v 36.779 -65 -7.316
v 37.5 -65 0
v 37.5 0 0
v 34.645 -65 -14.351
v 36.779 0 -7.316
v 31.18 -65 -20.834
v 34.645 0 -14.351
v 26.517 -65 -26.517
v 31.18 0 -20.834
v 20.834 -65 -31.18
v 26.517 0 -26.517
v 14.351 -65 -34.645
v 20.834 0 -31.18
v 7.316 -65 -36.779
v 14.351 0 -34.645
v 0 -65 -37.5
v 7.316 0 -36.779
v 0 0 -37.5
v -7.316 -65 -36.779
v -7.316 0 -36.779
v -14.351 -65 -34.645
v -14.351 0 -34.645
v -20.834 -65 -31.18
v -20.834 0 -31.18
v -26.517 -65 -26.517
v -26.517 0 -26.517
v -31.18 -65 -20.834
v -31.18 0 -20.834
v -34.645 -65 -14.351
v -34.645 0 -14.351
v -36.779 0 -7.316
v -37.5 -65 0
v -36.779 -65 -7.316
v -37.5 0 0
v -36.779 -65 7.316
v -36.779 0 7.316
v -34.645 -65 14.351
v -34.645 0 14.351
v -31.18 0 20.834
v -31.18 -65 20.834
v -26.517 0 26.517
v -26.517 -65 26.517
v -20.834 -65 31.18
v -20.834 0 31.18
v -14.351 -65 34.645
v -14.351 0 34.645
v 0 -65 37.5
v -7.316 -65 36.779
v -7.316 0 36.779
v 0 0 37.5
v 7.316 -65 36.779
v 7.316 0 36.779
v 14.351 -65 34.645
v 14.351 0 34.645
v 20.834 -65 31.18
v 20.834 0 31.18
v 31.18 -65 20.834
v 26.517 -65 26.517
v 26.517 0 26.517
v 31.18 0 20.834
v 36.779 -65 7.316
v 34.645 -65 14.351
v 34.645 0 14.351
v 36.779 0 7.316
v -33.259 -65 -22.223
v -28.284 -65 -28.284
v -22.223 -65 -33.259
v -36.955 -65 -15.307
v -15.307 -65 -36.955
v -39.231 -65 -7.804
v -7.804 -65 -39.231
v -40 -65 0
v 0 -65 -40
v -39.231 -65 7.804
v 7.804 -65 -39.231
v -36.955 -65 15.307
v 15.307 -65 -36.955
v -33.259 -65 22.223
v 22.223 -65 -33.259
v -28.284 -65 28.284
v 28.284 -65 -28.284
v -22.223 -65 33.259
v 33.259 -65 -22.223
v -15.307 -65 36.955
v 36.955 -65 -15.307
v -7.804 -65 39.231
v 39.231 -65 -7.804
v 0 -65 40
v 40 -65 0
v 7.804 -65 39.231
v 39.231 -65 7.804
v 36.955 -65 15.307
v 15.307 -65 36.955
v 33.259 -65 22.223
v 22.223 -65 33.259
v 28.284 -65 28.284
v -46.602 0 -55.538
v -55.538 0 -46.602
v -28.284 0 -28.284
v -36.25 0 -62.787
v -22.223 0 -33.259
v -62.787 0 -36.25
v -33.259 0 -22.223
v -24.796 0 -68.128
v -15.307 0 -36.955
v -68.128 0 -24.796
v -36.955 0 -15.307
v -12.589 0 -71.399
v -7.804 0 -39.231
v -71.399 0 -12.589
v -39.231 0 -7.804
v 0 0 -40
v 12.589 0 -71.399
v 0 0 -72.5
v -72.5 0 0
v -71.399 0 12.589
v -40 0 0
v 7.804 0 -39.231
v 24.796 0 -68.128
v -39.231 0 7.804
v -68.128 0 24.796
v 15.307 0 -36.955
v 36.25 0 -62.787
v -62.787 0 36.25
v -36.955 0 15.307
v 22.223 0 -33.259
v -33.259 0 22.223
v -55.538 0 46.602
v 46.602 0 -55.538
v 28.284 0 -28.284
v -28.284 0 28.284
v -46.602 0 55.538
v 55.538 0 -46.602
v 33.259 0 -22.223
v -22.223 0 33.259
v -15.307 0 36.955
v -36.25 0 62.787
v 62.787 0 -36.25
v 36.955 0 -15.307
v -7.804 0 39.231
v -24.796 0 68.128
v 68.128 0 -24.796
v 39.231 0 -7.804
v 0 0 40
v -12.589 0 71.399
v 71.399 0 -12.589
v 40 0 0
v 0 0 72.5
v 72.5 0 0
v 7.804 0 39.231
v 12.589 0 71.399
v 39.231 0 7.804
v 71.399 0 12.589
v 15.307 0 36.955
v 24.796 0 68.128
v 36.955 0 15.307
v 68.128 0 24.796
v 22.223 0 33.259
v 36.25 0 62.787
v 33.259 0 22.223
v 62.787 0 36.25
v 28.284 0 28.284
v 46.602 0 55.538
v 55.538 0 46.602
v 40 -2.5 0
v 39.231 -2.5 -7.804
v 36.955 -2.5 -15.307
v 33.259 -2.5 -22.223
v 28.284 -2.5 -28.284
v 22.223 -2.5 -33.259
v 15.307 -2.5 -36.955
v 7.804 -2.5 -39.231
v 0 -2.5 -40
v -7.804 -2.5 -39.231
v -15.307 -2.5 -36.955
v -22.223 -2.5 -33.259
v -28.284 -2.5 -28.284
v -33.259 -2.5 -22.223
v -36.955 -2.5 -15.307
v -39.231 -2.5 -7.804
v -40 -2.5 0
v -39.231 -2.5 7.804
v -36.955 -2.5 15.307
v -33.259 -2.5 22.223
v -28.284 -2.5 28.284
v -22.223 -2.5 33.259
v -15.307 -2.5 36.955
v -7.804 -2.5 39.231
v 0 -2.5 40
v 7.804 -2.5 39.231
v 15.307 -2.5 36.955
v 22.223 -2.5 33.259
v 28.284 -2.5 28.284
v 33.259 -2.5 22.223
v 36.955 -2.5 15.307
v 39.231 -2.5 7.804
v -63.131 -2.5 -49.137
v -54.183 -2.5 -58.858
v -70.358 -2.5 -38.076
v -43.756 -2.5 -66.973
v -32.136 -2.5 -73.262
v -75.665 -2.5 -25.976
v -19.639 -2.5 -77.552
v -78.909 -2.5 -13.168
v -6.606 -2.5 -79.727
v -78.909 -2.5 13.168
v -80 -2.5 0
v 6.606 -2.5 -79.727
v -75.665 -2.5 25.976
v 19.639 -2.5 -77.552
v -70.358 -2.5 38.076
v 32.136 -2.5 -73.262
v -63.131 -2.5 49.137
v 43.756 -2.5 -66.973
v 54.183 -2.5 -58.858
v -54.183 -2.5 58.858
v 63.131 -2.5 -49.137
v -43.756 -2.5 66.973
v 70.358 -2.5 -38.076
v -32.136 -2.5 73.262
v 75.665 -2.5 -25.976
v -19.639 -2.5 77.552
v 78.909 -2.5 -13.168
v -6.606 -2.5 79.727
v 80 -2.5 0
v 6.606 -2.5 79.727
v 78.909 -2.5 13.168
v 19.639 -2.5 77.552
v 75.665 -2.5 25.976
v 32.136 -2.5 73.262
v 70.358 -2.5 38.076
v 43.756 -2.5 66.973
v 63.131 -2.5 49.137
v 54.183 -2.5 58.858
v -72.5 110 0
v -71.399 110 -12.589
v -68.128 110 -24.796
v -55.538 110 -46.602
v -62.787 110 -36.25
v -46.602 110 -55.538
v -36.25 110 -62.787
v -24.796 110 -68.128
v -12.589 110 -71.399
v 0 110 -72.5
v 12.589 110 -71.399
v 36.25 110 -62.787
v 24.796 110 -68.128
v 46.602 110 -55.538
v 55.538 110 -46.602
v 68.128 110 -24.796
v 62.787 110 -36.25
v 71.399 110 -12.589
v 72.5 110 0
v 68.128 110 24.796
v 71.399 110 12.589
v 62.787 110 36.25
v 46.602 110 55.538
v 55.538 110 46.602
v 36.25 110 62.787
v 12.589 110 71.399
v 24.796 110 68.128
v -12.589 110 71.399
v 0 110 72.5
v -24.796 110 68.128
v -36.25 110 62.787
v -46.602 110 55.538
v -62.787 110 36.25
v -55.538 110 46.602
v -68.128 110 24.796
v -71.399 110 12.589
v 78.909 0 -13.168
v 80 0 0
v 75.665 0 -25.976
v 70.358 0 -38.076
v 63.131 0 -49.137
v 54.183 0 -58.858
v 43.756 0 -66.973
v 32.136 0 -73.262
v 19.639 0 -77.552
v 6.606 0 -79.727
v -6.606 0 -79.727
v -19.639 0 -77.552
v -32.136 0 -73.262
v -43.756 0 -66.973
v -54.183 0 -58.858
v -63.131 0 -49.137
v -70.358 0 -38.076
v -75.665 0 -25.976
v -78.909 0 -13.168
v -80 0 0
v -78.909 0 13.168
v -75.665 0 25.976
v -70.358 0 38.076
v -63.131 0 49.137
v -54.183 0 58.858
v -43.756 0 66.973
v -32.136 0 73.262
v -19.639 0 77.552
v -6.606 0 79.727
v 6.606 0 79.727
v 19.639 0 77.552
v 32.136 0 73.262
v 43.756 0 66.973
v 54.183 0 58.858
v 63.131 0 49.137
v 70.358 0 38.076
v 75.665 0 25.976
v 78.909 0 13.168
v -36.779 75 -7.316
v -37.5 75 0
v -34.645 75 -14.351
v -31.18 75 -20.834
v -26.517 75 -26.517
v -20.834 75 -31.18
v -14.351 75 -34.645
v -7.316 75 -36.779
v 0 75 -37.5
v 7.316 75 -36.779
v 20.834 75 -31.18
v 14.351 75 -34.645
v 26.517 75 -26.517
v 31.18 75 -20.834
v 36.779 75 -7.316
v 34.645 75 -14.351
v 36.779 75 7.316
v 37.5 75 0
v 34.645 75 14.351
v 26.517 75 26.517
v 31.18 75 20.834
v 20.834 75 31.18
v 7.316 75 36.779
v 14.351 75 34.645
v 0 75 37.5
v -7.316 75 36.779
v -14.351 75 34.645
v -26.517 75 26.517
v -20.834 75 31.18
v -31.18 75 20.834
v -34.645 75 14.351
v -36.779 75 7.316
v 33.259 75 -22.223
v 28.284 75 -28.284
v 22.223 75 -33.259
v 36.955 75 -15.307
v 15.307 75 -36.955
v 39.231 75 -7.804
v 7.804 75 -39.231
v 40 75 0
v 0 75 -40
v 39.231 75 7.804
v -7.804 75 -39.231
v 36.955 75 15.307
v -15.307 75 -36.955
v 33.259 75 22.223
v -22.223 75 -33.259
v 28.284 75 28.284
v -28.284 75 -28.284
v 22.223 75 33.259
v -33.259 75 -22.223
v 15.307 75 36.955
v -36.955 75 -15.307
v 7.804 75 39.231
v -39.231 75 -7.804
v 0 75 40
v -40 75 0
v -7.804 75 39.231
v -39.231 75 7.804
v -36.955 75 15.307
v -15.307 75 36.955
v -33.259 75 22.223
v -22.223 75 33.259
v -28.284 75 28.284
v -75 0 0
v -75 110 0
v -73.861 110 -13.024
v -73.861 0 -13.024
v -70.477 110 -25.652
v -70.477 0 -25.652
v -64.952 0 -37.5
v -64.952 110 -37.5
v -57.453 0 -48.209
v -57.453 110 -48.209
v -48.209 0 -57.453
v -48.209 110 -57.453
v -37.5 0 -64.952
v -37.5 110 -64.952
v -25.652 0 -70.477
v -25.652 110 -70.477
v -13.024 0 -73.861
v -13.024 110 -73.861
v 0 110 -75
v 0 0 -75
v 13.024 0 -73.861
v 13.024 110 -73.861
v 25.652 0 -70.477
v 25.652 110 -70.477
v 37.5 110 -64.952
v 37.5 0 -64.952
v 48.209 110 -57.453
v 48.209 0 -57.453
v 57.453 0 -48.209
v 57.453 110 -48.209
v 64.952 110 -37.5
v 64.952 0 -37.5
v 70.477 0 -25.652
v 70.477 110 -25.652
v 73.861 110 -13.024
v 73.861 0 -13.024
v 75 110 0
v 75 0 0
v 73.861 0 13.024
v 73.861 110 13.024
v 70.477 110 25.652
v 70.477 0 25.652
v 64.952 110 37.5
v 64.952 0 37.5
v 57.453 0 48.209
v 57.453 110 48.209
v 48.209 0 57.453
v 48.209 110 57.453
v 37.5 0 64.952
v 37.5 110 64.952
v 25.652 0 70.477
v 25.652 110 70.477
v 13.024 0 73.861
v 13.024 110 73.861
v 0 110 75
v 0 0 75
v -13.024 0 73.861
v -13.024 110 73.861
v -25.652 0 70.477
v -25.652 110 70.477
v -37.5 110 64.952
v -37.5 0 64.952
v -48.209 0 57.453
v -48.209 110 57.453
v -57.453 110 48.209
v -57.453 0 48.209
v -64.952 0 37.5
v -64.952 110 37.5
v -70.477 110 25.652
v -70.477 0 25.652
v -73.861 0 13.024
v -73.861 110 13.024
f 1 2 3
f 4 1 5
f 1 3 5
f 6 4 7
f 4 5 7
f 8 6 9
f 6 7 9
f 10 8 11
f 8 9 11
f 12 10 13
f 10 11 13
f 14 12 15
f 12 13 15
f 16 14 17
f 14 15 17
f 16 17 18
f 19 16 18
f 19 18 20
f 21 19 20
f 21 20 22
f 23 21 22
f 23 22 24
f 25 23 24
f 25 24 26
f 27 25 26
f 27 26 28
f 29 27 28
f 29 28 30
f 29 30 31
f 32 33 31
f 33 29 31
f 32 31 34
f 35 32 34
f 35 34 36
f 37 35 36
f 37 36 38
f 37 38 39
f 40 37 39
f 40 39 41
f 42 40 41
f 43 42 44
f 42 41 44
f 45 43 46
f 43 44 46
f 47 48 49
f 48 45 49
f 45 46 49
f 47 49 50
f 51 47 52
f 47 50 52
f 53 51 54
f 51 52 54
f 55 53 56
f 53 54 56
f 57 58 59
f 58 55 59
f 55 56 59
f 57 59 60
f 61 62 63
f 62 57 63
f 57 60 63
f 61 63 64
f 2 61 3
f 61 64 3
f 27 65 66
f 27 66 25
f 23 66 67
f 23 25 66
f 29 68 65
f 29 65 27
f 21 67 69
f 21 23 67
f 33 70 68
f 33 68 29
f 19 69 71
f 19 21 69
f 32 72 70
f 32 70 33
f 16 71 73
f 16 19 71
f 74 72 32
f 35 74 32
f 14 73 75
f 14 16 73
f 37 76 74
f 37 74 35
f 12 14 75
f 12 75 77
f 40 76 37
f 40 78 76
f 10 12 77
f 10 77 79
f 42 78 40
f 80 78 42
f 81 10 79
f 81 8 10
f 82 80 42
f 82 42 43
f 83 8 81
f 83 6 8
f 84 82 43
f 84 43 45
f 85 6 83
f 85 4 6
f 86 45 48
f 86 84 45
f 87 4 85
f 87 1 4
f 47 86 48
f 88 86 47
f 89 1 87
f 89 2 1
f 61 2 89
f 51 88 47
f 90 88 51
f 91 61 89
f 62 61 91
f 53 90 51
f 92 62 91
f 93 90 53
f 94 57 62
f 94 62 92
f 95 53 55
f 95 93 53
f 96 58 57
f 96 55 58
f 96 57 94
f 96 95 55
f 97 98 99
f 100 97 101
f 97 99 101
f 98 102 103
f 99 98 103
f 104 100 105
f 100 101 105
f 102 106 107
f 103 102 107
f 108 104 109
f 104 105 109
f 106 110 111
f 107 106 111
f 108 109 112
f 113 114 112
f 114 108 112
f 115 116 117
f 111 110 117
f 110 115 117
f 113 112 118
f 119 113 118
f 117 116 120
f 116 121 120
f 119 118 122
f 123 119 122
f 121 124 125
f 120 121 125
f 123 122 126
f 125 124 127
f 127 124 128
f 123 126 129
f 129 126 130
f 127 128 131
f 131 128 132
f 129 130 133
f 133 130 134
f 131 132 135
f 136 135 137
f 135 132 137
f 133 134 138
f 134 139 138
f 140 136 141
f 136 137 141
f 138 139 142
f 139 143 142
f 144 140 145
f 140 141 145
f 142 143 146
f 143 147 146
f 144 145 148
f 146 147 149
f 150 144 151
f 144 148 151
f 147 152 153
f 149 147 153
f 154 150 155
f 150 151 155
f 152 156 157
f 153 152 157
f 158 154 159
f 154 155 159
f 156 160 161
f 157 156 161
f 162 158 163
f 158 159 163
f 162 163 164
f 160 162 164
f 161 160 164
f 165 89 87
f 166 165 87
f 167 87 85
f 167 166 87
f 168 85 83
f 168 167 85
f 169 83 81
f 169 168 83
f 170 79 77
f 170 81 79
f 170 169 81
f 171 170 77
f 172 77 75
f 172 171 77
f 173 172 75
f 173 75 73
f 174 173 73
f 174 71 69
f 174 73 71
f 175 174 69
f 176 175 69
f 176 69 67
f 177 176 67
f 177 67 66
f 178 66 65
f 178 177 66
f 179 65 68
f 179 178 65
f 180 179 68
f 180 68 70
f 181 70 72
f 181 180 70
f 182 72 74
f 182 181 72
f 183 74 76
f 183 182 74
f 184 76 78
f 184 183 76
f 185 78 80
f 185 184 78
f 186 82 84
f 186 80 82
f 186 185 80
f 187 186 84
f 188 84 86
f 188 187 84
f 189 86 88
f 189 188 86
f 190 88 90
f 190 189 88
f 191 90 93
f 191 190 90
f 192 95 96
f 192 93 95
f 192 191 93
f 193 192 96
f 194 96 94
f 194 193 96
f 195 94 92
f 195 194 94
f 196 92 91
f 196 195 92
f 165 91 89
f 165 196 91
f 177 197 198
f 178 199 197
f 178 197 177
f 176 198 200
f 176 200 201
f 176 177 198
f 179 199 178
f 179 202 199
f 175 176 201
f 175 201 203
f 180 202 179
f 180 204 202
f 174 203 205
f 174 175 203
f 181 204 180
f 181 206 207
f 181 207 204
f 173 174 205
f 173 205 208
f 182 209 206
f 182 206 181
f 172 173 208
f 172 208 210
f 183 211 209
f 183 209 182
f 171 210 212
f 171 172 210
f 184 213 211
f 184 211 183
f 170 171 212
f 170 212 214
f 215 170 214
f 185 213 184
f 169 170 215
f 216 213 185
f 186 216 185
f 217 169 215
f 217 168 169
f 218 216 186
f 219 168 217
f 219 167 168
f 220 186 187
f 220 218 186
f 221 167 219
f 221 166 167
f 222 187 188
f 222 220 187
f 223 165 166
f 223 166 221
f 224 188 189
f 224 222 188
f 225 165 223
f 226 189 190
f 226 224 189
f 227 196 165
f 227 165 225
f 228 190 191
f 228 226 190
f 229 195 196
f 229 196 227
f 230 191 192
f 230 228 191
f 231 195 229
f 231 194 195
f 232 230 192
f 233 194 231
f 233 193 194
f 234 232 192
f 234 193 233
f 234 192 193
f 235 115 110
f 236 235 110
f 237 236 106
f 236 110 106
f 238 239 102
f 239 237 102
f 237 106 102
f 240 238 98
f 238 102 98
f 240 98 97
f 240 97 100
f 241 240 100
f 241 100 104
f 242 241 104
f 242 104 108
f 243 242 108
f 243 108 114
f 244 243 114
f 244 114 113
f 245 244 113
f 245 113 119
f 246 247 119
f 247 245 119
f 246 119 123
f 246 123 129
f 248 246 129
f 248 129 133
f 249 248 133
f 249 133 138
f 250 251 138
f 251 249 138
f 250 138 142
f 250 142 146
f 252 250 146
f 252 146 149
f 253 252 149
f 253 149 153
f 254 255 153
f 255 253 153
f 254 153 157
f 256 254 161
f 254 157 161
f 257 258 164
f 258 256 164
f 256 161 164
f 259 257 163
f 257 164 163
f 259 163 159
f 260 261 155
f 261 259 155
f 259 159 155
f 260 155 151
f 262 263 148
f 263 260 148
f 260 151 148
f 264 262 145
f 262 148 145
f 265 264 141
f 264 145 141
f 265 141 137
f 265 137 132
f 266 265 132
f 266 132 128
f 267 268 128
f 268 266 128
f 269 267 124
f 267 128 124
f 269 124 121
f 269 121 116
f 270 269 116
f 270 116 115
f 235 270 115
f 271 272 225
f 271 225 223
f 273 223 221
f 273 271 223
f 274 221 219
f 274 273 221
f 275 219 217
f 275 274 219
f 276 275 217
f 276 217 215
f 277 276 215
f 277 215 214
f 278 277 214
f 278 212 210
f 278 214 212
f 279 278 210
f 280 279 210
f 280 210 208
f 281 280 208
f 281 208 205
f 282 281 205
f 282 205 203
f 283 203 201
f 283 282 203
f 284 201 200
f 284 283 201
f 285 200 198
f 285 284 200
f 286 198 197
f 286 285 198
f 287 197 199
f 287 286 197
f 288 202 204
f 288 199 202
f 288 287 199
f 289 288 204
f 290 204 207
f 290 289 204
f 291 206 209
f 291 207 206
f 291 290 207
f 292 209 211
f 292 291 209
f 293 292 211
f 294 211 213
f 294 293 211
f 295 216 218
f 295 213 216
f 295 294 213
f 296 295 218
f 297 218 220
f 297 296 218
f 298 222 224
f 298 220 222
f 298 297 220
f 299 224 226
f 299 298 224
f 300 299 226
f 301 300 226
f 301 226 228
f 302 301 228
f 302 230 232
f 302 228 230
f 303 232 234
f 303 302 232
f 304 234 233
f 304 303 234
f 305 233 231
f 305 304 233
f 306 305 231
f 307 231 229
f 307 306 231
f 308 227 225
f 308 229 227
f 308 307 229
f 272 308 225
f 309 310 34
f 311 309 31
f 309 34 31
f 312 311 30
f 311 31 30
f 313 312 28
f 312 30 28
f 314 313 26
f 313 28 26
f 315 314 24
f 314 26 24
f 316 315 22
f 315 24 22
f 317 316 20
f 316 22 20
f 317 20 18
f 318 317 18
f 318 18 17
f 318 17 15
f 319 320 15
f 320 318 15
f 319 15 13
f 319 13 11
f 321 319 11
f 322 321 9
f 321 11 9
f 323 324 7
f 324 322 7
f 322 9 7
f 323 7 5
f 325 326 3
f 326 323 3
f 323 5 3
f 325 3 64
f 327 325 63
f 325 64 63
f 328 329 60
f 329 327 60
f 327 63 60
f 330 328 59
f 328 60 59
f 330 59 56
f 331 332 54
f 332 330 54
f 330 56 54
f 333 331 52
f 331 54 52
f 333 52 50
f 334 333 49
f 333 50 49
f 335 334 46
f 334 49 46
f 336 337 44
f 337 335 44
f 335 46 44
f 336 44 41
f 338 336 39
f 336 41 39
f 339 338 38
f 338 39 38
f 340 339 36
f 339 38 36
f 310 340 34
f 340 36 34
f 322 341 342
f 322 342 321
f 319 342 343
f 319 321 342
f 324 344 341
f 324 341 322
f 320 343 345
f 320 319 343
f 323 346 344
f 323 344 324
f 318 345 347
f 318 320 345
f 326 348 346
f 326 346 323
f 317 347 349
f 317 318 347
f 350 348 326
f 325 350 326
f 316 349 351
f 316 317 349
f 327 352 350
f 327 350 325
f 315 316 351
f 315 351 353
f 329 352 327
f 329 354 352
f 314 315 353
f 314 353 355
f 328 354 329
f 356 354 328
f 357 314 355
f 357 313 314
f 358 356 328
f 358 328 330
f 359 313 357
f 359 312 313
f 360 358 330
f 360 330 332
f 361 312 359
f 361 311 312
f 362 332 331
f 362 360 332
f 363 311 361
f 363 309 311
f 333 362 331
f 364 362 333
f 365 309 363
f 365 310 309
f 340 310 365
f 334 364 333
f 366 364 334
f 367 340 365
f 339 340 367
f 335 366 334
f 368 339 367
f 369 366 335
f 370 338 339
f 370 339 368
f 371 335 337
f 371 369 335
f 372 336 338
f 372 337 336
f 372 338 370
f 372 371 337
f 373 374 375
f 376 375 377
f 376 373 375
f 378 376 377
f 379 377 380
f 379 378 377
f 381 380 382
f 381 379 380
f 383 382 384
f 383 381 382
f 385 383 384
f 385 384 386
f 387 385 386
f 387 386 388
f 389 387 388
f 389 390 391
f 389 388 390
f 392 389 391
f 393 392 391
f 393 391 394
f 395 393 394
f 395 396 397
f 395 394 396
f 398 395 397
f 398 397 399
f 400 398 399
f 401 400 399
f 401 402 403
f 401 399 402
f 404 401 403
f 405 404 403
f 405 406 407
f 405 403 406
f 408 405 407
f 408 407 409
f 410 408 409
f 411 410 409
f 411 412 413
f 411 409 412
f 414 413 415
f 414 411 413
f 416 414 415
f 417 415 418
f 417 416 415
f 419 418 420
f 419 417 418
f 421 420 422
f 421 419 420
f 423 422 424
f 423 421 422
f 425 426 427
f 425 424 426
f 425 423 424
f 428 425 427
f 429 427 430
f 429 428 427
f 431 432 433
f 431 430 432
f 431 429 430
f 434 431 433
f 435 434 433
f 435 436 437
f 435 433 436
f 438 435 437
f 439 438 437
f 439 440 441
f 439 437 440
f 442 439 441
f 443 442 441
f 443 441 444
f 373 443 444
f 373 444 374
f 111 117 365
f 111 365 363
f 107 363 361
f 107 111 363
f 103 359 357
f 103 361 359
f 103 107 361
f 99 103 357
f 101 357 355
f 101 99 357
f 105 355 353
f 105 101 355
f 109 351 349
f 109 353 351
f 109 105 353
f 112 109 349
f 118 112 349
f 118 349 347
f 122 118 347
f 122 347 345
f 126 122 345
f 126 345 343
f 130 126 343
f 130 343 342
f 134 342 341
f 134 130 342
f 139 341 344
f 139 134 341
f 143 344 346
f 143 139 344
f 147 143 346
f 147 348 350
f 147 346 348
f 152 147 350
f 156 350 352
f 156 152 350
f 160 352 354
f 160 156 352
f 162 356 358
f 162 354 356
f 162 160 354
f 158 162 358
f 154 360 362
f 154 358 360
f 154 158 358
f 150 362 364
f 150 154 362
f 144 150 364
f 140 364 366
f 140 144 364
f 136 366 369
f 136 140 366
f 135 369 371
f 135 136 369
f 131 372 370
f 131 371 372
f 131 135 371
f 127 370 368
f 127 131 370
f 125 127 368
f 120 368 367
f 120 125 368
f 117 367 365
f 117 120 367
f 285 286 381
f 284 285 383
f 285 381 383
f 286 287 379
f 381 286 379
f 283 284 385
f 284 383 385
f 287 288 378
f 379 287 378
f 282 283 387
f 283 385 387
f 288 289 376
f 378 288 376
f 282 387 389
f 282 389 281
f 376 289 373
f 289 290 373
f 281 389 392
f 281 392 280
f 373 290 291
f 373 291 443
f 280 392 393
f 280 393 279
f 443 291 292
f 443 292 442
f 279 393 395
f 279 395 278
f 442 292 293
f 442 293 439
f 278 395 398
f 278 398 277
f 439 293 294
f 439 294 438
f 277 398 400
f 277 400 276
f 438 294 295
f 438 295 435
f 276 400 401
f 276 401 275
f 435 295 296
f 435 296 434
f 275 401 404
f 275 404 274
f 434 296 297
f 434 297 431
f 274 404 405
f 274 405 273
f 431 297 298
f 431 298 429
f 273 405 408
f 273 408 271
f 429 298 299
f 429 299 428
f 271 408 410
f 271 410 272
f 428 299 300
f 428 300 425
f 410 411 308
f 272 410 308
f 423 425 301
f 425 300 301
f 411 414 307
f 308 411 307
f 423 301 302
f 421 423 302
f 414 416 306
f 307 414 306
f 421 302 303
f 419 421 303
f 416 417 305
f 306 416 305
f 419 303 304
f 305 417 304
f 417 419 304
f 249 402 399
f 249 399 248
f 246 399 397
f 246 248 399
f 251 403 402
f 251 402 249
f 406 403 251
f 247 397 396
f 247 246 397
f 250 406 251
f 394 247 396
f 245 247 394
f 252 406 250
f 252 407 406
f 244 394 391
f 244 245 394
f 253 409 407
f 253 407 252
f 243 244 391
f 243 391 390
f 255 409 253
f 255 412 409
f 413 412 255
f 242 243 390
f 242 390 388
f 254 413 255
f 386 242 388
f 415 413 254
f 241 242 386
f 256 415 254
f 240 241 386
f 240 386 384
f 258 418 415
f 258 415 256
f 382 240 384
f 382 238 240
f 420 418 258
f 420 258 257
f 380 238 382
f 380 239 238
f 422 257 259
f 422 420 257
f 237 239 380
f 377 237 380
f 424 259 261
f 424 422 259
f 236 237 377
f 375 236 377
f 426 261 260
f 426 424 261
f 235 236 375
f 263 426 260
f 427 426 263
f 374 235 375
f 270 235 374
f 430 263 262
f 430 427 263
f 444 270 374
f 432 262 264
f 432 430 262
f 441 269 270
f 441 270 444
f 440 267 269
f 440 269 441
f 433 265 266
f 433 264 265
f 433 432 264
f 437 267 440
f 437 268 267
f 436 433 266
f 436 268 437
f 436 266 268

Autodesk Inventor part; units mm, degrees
ref_plane "YZ Plane" through (0, 0, 0) normal (1, 0, 0) x (0, 1, 0)
ref_plane "XZ Plane" through (0, 0, 0) normal (0, 1, 0) x (-1, 0, 0)
ref_plane "XY Plane" through (0, 0, 0) normal (0, 0, 1) x (1, 0, 0)
sketch "Sketch1" plane through (0, 0, 0) normal (0, 1, 0) x (-1, 0, 0)
  circle A0 centre (0, 0) radius 72.5
  circle A1 centre (0, 0) radius 75
  dimension "d0" = 150
  dimension "d1" = 145
extrude "Extrusion1" add sketch "Sketch1" along normal blind 110
sketch "Sketch2" plane through (0, 0, 0) normal (0, 1, 0) x (-1, 0, 0)
  circle A0 centre (0, 0) radius 40
  circle A1 centre (0, 0) radius 37.5
  dimension "d4" = 75
  dimension "d5" = 2.5
extrude "Extrusion2" add sketch "Sketch2" along normal blind 75
sketch "Sketch3" plane through (0, 0, 0) normal (0, -1, 0) x (1, 0, 0)
  circle A0 centre (0, 0) radius 80
  circle A1 centre (0, 0) radius 40 projected
  dimension "d8" = 160
extrude "Extrusion3" add sketch "Sketch3" along normal blind 2.5
sketch "Sketch4" plane through (0, 0, 0) normal (0, -1, 0) x (1, 0, 0)
  circle A0 centre (0, 0) radius 40 projected
  circle A1 centre (0, 0) radius 37.5 projected
extrude "Extrusion4" add sketch "Sketch4" along normal blind 65
properties part number "_Ref_SkimmerCup"
